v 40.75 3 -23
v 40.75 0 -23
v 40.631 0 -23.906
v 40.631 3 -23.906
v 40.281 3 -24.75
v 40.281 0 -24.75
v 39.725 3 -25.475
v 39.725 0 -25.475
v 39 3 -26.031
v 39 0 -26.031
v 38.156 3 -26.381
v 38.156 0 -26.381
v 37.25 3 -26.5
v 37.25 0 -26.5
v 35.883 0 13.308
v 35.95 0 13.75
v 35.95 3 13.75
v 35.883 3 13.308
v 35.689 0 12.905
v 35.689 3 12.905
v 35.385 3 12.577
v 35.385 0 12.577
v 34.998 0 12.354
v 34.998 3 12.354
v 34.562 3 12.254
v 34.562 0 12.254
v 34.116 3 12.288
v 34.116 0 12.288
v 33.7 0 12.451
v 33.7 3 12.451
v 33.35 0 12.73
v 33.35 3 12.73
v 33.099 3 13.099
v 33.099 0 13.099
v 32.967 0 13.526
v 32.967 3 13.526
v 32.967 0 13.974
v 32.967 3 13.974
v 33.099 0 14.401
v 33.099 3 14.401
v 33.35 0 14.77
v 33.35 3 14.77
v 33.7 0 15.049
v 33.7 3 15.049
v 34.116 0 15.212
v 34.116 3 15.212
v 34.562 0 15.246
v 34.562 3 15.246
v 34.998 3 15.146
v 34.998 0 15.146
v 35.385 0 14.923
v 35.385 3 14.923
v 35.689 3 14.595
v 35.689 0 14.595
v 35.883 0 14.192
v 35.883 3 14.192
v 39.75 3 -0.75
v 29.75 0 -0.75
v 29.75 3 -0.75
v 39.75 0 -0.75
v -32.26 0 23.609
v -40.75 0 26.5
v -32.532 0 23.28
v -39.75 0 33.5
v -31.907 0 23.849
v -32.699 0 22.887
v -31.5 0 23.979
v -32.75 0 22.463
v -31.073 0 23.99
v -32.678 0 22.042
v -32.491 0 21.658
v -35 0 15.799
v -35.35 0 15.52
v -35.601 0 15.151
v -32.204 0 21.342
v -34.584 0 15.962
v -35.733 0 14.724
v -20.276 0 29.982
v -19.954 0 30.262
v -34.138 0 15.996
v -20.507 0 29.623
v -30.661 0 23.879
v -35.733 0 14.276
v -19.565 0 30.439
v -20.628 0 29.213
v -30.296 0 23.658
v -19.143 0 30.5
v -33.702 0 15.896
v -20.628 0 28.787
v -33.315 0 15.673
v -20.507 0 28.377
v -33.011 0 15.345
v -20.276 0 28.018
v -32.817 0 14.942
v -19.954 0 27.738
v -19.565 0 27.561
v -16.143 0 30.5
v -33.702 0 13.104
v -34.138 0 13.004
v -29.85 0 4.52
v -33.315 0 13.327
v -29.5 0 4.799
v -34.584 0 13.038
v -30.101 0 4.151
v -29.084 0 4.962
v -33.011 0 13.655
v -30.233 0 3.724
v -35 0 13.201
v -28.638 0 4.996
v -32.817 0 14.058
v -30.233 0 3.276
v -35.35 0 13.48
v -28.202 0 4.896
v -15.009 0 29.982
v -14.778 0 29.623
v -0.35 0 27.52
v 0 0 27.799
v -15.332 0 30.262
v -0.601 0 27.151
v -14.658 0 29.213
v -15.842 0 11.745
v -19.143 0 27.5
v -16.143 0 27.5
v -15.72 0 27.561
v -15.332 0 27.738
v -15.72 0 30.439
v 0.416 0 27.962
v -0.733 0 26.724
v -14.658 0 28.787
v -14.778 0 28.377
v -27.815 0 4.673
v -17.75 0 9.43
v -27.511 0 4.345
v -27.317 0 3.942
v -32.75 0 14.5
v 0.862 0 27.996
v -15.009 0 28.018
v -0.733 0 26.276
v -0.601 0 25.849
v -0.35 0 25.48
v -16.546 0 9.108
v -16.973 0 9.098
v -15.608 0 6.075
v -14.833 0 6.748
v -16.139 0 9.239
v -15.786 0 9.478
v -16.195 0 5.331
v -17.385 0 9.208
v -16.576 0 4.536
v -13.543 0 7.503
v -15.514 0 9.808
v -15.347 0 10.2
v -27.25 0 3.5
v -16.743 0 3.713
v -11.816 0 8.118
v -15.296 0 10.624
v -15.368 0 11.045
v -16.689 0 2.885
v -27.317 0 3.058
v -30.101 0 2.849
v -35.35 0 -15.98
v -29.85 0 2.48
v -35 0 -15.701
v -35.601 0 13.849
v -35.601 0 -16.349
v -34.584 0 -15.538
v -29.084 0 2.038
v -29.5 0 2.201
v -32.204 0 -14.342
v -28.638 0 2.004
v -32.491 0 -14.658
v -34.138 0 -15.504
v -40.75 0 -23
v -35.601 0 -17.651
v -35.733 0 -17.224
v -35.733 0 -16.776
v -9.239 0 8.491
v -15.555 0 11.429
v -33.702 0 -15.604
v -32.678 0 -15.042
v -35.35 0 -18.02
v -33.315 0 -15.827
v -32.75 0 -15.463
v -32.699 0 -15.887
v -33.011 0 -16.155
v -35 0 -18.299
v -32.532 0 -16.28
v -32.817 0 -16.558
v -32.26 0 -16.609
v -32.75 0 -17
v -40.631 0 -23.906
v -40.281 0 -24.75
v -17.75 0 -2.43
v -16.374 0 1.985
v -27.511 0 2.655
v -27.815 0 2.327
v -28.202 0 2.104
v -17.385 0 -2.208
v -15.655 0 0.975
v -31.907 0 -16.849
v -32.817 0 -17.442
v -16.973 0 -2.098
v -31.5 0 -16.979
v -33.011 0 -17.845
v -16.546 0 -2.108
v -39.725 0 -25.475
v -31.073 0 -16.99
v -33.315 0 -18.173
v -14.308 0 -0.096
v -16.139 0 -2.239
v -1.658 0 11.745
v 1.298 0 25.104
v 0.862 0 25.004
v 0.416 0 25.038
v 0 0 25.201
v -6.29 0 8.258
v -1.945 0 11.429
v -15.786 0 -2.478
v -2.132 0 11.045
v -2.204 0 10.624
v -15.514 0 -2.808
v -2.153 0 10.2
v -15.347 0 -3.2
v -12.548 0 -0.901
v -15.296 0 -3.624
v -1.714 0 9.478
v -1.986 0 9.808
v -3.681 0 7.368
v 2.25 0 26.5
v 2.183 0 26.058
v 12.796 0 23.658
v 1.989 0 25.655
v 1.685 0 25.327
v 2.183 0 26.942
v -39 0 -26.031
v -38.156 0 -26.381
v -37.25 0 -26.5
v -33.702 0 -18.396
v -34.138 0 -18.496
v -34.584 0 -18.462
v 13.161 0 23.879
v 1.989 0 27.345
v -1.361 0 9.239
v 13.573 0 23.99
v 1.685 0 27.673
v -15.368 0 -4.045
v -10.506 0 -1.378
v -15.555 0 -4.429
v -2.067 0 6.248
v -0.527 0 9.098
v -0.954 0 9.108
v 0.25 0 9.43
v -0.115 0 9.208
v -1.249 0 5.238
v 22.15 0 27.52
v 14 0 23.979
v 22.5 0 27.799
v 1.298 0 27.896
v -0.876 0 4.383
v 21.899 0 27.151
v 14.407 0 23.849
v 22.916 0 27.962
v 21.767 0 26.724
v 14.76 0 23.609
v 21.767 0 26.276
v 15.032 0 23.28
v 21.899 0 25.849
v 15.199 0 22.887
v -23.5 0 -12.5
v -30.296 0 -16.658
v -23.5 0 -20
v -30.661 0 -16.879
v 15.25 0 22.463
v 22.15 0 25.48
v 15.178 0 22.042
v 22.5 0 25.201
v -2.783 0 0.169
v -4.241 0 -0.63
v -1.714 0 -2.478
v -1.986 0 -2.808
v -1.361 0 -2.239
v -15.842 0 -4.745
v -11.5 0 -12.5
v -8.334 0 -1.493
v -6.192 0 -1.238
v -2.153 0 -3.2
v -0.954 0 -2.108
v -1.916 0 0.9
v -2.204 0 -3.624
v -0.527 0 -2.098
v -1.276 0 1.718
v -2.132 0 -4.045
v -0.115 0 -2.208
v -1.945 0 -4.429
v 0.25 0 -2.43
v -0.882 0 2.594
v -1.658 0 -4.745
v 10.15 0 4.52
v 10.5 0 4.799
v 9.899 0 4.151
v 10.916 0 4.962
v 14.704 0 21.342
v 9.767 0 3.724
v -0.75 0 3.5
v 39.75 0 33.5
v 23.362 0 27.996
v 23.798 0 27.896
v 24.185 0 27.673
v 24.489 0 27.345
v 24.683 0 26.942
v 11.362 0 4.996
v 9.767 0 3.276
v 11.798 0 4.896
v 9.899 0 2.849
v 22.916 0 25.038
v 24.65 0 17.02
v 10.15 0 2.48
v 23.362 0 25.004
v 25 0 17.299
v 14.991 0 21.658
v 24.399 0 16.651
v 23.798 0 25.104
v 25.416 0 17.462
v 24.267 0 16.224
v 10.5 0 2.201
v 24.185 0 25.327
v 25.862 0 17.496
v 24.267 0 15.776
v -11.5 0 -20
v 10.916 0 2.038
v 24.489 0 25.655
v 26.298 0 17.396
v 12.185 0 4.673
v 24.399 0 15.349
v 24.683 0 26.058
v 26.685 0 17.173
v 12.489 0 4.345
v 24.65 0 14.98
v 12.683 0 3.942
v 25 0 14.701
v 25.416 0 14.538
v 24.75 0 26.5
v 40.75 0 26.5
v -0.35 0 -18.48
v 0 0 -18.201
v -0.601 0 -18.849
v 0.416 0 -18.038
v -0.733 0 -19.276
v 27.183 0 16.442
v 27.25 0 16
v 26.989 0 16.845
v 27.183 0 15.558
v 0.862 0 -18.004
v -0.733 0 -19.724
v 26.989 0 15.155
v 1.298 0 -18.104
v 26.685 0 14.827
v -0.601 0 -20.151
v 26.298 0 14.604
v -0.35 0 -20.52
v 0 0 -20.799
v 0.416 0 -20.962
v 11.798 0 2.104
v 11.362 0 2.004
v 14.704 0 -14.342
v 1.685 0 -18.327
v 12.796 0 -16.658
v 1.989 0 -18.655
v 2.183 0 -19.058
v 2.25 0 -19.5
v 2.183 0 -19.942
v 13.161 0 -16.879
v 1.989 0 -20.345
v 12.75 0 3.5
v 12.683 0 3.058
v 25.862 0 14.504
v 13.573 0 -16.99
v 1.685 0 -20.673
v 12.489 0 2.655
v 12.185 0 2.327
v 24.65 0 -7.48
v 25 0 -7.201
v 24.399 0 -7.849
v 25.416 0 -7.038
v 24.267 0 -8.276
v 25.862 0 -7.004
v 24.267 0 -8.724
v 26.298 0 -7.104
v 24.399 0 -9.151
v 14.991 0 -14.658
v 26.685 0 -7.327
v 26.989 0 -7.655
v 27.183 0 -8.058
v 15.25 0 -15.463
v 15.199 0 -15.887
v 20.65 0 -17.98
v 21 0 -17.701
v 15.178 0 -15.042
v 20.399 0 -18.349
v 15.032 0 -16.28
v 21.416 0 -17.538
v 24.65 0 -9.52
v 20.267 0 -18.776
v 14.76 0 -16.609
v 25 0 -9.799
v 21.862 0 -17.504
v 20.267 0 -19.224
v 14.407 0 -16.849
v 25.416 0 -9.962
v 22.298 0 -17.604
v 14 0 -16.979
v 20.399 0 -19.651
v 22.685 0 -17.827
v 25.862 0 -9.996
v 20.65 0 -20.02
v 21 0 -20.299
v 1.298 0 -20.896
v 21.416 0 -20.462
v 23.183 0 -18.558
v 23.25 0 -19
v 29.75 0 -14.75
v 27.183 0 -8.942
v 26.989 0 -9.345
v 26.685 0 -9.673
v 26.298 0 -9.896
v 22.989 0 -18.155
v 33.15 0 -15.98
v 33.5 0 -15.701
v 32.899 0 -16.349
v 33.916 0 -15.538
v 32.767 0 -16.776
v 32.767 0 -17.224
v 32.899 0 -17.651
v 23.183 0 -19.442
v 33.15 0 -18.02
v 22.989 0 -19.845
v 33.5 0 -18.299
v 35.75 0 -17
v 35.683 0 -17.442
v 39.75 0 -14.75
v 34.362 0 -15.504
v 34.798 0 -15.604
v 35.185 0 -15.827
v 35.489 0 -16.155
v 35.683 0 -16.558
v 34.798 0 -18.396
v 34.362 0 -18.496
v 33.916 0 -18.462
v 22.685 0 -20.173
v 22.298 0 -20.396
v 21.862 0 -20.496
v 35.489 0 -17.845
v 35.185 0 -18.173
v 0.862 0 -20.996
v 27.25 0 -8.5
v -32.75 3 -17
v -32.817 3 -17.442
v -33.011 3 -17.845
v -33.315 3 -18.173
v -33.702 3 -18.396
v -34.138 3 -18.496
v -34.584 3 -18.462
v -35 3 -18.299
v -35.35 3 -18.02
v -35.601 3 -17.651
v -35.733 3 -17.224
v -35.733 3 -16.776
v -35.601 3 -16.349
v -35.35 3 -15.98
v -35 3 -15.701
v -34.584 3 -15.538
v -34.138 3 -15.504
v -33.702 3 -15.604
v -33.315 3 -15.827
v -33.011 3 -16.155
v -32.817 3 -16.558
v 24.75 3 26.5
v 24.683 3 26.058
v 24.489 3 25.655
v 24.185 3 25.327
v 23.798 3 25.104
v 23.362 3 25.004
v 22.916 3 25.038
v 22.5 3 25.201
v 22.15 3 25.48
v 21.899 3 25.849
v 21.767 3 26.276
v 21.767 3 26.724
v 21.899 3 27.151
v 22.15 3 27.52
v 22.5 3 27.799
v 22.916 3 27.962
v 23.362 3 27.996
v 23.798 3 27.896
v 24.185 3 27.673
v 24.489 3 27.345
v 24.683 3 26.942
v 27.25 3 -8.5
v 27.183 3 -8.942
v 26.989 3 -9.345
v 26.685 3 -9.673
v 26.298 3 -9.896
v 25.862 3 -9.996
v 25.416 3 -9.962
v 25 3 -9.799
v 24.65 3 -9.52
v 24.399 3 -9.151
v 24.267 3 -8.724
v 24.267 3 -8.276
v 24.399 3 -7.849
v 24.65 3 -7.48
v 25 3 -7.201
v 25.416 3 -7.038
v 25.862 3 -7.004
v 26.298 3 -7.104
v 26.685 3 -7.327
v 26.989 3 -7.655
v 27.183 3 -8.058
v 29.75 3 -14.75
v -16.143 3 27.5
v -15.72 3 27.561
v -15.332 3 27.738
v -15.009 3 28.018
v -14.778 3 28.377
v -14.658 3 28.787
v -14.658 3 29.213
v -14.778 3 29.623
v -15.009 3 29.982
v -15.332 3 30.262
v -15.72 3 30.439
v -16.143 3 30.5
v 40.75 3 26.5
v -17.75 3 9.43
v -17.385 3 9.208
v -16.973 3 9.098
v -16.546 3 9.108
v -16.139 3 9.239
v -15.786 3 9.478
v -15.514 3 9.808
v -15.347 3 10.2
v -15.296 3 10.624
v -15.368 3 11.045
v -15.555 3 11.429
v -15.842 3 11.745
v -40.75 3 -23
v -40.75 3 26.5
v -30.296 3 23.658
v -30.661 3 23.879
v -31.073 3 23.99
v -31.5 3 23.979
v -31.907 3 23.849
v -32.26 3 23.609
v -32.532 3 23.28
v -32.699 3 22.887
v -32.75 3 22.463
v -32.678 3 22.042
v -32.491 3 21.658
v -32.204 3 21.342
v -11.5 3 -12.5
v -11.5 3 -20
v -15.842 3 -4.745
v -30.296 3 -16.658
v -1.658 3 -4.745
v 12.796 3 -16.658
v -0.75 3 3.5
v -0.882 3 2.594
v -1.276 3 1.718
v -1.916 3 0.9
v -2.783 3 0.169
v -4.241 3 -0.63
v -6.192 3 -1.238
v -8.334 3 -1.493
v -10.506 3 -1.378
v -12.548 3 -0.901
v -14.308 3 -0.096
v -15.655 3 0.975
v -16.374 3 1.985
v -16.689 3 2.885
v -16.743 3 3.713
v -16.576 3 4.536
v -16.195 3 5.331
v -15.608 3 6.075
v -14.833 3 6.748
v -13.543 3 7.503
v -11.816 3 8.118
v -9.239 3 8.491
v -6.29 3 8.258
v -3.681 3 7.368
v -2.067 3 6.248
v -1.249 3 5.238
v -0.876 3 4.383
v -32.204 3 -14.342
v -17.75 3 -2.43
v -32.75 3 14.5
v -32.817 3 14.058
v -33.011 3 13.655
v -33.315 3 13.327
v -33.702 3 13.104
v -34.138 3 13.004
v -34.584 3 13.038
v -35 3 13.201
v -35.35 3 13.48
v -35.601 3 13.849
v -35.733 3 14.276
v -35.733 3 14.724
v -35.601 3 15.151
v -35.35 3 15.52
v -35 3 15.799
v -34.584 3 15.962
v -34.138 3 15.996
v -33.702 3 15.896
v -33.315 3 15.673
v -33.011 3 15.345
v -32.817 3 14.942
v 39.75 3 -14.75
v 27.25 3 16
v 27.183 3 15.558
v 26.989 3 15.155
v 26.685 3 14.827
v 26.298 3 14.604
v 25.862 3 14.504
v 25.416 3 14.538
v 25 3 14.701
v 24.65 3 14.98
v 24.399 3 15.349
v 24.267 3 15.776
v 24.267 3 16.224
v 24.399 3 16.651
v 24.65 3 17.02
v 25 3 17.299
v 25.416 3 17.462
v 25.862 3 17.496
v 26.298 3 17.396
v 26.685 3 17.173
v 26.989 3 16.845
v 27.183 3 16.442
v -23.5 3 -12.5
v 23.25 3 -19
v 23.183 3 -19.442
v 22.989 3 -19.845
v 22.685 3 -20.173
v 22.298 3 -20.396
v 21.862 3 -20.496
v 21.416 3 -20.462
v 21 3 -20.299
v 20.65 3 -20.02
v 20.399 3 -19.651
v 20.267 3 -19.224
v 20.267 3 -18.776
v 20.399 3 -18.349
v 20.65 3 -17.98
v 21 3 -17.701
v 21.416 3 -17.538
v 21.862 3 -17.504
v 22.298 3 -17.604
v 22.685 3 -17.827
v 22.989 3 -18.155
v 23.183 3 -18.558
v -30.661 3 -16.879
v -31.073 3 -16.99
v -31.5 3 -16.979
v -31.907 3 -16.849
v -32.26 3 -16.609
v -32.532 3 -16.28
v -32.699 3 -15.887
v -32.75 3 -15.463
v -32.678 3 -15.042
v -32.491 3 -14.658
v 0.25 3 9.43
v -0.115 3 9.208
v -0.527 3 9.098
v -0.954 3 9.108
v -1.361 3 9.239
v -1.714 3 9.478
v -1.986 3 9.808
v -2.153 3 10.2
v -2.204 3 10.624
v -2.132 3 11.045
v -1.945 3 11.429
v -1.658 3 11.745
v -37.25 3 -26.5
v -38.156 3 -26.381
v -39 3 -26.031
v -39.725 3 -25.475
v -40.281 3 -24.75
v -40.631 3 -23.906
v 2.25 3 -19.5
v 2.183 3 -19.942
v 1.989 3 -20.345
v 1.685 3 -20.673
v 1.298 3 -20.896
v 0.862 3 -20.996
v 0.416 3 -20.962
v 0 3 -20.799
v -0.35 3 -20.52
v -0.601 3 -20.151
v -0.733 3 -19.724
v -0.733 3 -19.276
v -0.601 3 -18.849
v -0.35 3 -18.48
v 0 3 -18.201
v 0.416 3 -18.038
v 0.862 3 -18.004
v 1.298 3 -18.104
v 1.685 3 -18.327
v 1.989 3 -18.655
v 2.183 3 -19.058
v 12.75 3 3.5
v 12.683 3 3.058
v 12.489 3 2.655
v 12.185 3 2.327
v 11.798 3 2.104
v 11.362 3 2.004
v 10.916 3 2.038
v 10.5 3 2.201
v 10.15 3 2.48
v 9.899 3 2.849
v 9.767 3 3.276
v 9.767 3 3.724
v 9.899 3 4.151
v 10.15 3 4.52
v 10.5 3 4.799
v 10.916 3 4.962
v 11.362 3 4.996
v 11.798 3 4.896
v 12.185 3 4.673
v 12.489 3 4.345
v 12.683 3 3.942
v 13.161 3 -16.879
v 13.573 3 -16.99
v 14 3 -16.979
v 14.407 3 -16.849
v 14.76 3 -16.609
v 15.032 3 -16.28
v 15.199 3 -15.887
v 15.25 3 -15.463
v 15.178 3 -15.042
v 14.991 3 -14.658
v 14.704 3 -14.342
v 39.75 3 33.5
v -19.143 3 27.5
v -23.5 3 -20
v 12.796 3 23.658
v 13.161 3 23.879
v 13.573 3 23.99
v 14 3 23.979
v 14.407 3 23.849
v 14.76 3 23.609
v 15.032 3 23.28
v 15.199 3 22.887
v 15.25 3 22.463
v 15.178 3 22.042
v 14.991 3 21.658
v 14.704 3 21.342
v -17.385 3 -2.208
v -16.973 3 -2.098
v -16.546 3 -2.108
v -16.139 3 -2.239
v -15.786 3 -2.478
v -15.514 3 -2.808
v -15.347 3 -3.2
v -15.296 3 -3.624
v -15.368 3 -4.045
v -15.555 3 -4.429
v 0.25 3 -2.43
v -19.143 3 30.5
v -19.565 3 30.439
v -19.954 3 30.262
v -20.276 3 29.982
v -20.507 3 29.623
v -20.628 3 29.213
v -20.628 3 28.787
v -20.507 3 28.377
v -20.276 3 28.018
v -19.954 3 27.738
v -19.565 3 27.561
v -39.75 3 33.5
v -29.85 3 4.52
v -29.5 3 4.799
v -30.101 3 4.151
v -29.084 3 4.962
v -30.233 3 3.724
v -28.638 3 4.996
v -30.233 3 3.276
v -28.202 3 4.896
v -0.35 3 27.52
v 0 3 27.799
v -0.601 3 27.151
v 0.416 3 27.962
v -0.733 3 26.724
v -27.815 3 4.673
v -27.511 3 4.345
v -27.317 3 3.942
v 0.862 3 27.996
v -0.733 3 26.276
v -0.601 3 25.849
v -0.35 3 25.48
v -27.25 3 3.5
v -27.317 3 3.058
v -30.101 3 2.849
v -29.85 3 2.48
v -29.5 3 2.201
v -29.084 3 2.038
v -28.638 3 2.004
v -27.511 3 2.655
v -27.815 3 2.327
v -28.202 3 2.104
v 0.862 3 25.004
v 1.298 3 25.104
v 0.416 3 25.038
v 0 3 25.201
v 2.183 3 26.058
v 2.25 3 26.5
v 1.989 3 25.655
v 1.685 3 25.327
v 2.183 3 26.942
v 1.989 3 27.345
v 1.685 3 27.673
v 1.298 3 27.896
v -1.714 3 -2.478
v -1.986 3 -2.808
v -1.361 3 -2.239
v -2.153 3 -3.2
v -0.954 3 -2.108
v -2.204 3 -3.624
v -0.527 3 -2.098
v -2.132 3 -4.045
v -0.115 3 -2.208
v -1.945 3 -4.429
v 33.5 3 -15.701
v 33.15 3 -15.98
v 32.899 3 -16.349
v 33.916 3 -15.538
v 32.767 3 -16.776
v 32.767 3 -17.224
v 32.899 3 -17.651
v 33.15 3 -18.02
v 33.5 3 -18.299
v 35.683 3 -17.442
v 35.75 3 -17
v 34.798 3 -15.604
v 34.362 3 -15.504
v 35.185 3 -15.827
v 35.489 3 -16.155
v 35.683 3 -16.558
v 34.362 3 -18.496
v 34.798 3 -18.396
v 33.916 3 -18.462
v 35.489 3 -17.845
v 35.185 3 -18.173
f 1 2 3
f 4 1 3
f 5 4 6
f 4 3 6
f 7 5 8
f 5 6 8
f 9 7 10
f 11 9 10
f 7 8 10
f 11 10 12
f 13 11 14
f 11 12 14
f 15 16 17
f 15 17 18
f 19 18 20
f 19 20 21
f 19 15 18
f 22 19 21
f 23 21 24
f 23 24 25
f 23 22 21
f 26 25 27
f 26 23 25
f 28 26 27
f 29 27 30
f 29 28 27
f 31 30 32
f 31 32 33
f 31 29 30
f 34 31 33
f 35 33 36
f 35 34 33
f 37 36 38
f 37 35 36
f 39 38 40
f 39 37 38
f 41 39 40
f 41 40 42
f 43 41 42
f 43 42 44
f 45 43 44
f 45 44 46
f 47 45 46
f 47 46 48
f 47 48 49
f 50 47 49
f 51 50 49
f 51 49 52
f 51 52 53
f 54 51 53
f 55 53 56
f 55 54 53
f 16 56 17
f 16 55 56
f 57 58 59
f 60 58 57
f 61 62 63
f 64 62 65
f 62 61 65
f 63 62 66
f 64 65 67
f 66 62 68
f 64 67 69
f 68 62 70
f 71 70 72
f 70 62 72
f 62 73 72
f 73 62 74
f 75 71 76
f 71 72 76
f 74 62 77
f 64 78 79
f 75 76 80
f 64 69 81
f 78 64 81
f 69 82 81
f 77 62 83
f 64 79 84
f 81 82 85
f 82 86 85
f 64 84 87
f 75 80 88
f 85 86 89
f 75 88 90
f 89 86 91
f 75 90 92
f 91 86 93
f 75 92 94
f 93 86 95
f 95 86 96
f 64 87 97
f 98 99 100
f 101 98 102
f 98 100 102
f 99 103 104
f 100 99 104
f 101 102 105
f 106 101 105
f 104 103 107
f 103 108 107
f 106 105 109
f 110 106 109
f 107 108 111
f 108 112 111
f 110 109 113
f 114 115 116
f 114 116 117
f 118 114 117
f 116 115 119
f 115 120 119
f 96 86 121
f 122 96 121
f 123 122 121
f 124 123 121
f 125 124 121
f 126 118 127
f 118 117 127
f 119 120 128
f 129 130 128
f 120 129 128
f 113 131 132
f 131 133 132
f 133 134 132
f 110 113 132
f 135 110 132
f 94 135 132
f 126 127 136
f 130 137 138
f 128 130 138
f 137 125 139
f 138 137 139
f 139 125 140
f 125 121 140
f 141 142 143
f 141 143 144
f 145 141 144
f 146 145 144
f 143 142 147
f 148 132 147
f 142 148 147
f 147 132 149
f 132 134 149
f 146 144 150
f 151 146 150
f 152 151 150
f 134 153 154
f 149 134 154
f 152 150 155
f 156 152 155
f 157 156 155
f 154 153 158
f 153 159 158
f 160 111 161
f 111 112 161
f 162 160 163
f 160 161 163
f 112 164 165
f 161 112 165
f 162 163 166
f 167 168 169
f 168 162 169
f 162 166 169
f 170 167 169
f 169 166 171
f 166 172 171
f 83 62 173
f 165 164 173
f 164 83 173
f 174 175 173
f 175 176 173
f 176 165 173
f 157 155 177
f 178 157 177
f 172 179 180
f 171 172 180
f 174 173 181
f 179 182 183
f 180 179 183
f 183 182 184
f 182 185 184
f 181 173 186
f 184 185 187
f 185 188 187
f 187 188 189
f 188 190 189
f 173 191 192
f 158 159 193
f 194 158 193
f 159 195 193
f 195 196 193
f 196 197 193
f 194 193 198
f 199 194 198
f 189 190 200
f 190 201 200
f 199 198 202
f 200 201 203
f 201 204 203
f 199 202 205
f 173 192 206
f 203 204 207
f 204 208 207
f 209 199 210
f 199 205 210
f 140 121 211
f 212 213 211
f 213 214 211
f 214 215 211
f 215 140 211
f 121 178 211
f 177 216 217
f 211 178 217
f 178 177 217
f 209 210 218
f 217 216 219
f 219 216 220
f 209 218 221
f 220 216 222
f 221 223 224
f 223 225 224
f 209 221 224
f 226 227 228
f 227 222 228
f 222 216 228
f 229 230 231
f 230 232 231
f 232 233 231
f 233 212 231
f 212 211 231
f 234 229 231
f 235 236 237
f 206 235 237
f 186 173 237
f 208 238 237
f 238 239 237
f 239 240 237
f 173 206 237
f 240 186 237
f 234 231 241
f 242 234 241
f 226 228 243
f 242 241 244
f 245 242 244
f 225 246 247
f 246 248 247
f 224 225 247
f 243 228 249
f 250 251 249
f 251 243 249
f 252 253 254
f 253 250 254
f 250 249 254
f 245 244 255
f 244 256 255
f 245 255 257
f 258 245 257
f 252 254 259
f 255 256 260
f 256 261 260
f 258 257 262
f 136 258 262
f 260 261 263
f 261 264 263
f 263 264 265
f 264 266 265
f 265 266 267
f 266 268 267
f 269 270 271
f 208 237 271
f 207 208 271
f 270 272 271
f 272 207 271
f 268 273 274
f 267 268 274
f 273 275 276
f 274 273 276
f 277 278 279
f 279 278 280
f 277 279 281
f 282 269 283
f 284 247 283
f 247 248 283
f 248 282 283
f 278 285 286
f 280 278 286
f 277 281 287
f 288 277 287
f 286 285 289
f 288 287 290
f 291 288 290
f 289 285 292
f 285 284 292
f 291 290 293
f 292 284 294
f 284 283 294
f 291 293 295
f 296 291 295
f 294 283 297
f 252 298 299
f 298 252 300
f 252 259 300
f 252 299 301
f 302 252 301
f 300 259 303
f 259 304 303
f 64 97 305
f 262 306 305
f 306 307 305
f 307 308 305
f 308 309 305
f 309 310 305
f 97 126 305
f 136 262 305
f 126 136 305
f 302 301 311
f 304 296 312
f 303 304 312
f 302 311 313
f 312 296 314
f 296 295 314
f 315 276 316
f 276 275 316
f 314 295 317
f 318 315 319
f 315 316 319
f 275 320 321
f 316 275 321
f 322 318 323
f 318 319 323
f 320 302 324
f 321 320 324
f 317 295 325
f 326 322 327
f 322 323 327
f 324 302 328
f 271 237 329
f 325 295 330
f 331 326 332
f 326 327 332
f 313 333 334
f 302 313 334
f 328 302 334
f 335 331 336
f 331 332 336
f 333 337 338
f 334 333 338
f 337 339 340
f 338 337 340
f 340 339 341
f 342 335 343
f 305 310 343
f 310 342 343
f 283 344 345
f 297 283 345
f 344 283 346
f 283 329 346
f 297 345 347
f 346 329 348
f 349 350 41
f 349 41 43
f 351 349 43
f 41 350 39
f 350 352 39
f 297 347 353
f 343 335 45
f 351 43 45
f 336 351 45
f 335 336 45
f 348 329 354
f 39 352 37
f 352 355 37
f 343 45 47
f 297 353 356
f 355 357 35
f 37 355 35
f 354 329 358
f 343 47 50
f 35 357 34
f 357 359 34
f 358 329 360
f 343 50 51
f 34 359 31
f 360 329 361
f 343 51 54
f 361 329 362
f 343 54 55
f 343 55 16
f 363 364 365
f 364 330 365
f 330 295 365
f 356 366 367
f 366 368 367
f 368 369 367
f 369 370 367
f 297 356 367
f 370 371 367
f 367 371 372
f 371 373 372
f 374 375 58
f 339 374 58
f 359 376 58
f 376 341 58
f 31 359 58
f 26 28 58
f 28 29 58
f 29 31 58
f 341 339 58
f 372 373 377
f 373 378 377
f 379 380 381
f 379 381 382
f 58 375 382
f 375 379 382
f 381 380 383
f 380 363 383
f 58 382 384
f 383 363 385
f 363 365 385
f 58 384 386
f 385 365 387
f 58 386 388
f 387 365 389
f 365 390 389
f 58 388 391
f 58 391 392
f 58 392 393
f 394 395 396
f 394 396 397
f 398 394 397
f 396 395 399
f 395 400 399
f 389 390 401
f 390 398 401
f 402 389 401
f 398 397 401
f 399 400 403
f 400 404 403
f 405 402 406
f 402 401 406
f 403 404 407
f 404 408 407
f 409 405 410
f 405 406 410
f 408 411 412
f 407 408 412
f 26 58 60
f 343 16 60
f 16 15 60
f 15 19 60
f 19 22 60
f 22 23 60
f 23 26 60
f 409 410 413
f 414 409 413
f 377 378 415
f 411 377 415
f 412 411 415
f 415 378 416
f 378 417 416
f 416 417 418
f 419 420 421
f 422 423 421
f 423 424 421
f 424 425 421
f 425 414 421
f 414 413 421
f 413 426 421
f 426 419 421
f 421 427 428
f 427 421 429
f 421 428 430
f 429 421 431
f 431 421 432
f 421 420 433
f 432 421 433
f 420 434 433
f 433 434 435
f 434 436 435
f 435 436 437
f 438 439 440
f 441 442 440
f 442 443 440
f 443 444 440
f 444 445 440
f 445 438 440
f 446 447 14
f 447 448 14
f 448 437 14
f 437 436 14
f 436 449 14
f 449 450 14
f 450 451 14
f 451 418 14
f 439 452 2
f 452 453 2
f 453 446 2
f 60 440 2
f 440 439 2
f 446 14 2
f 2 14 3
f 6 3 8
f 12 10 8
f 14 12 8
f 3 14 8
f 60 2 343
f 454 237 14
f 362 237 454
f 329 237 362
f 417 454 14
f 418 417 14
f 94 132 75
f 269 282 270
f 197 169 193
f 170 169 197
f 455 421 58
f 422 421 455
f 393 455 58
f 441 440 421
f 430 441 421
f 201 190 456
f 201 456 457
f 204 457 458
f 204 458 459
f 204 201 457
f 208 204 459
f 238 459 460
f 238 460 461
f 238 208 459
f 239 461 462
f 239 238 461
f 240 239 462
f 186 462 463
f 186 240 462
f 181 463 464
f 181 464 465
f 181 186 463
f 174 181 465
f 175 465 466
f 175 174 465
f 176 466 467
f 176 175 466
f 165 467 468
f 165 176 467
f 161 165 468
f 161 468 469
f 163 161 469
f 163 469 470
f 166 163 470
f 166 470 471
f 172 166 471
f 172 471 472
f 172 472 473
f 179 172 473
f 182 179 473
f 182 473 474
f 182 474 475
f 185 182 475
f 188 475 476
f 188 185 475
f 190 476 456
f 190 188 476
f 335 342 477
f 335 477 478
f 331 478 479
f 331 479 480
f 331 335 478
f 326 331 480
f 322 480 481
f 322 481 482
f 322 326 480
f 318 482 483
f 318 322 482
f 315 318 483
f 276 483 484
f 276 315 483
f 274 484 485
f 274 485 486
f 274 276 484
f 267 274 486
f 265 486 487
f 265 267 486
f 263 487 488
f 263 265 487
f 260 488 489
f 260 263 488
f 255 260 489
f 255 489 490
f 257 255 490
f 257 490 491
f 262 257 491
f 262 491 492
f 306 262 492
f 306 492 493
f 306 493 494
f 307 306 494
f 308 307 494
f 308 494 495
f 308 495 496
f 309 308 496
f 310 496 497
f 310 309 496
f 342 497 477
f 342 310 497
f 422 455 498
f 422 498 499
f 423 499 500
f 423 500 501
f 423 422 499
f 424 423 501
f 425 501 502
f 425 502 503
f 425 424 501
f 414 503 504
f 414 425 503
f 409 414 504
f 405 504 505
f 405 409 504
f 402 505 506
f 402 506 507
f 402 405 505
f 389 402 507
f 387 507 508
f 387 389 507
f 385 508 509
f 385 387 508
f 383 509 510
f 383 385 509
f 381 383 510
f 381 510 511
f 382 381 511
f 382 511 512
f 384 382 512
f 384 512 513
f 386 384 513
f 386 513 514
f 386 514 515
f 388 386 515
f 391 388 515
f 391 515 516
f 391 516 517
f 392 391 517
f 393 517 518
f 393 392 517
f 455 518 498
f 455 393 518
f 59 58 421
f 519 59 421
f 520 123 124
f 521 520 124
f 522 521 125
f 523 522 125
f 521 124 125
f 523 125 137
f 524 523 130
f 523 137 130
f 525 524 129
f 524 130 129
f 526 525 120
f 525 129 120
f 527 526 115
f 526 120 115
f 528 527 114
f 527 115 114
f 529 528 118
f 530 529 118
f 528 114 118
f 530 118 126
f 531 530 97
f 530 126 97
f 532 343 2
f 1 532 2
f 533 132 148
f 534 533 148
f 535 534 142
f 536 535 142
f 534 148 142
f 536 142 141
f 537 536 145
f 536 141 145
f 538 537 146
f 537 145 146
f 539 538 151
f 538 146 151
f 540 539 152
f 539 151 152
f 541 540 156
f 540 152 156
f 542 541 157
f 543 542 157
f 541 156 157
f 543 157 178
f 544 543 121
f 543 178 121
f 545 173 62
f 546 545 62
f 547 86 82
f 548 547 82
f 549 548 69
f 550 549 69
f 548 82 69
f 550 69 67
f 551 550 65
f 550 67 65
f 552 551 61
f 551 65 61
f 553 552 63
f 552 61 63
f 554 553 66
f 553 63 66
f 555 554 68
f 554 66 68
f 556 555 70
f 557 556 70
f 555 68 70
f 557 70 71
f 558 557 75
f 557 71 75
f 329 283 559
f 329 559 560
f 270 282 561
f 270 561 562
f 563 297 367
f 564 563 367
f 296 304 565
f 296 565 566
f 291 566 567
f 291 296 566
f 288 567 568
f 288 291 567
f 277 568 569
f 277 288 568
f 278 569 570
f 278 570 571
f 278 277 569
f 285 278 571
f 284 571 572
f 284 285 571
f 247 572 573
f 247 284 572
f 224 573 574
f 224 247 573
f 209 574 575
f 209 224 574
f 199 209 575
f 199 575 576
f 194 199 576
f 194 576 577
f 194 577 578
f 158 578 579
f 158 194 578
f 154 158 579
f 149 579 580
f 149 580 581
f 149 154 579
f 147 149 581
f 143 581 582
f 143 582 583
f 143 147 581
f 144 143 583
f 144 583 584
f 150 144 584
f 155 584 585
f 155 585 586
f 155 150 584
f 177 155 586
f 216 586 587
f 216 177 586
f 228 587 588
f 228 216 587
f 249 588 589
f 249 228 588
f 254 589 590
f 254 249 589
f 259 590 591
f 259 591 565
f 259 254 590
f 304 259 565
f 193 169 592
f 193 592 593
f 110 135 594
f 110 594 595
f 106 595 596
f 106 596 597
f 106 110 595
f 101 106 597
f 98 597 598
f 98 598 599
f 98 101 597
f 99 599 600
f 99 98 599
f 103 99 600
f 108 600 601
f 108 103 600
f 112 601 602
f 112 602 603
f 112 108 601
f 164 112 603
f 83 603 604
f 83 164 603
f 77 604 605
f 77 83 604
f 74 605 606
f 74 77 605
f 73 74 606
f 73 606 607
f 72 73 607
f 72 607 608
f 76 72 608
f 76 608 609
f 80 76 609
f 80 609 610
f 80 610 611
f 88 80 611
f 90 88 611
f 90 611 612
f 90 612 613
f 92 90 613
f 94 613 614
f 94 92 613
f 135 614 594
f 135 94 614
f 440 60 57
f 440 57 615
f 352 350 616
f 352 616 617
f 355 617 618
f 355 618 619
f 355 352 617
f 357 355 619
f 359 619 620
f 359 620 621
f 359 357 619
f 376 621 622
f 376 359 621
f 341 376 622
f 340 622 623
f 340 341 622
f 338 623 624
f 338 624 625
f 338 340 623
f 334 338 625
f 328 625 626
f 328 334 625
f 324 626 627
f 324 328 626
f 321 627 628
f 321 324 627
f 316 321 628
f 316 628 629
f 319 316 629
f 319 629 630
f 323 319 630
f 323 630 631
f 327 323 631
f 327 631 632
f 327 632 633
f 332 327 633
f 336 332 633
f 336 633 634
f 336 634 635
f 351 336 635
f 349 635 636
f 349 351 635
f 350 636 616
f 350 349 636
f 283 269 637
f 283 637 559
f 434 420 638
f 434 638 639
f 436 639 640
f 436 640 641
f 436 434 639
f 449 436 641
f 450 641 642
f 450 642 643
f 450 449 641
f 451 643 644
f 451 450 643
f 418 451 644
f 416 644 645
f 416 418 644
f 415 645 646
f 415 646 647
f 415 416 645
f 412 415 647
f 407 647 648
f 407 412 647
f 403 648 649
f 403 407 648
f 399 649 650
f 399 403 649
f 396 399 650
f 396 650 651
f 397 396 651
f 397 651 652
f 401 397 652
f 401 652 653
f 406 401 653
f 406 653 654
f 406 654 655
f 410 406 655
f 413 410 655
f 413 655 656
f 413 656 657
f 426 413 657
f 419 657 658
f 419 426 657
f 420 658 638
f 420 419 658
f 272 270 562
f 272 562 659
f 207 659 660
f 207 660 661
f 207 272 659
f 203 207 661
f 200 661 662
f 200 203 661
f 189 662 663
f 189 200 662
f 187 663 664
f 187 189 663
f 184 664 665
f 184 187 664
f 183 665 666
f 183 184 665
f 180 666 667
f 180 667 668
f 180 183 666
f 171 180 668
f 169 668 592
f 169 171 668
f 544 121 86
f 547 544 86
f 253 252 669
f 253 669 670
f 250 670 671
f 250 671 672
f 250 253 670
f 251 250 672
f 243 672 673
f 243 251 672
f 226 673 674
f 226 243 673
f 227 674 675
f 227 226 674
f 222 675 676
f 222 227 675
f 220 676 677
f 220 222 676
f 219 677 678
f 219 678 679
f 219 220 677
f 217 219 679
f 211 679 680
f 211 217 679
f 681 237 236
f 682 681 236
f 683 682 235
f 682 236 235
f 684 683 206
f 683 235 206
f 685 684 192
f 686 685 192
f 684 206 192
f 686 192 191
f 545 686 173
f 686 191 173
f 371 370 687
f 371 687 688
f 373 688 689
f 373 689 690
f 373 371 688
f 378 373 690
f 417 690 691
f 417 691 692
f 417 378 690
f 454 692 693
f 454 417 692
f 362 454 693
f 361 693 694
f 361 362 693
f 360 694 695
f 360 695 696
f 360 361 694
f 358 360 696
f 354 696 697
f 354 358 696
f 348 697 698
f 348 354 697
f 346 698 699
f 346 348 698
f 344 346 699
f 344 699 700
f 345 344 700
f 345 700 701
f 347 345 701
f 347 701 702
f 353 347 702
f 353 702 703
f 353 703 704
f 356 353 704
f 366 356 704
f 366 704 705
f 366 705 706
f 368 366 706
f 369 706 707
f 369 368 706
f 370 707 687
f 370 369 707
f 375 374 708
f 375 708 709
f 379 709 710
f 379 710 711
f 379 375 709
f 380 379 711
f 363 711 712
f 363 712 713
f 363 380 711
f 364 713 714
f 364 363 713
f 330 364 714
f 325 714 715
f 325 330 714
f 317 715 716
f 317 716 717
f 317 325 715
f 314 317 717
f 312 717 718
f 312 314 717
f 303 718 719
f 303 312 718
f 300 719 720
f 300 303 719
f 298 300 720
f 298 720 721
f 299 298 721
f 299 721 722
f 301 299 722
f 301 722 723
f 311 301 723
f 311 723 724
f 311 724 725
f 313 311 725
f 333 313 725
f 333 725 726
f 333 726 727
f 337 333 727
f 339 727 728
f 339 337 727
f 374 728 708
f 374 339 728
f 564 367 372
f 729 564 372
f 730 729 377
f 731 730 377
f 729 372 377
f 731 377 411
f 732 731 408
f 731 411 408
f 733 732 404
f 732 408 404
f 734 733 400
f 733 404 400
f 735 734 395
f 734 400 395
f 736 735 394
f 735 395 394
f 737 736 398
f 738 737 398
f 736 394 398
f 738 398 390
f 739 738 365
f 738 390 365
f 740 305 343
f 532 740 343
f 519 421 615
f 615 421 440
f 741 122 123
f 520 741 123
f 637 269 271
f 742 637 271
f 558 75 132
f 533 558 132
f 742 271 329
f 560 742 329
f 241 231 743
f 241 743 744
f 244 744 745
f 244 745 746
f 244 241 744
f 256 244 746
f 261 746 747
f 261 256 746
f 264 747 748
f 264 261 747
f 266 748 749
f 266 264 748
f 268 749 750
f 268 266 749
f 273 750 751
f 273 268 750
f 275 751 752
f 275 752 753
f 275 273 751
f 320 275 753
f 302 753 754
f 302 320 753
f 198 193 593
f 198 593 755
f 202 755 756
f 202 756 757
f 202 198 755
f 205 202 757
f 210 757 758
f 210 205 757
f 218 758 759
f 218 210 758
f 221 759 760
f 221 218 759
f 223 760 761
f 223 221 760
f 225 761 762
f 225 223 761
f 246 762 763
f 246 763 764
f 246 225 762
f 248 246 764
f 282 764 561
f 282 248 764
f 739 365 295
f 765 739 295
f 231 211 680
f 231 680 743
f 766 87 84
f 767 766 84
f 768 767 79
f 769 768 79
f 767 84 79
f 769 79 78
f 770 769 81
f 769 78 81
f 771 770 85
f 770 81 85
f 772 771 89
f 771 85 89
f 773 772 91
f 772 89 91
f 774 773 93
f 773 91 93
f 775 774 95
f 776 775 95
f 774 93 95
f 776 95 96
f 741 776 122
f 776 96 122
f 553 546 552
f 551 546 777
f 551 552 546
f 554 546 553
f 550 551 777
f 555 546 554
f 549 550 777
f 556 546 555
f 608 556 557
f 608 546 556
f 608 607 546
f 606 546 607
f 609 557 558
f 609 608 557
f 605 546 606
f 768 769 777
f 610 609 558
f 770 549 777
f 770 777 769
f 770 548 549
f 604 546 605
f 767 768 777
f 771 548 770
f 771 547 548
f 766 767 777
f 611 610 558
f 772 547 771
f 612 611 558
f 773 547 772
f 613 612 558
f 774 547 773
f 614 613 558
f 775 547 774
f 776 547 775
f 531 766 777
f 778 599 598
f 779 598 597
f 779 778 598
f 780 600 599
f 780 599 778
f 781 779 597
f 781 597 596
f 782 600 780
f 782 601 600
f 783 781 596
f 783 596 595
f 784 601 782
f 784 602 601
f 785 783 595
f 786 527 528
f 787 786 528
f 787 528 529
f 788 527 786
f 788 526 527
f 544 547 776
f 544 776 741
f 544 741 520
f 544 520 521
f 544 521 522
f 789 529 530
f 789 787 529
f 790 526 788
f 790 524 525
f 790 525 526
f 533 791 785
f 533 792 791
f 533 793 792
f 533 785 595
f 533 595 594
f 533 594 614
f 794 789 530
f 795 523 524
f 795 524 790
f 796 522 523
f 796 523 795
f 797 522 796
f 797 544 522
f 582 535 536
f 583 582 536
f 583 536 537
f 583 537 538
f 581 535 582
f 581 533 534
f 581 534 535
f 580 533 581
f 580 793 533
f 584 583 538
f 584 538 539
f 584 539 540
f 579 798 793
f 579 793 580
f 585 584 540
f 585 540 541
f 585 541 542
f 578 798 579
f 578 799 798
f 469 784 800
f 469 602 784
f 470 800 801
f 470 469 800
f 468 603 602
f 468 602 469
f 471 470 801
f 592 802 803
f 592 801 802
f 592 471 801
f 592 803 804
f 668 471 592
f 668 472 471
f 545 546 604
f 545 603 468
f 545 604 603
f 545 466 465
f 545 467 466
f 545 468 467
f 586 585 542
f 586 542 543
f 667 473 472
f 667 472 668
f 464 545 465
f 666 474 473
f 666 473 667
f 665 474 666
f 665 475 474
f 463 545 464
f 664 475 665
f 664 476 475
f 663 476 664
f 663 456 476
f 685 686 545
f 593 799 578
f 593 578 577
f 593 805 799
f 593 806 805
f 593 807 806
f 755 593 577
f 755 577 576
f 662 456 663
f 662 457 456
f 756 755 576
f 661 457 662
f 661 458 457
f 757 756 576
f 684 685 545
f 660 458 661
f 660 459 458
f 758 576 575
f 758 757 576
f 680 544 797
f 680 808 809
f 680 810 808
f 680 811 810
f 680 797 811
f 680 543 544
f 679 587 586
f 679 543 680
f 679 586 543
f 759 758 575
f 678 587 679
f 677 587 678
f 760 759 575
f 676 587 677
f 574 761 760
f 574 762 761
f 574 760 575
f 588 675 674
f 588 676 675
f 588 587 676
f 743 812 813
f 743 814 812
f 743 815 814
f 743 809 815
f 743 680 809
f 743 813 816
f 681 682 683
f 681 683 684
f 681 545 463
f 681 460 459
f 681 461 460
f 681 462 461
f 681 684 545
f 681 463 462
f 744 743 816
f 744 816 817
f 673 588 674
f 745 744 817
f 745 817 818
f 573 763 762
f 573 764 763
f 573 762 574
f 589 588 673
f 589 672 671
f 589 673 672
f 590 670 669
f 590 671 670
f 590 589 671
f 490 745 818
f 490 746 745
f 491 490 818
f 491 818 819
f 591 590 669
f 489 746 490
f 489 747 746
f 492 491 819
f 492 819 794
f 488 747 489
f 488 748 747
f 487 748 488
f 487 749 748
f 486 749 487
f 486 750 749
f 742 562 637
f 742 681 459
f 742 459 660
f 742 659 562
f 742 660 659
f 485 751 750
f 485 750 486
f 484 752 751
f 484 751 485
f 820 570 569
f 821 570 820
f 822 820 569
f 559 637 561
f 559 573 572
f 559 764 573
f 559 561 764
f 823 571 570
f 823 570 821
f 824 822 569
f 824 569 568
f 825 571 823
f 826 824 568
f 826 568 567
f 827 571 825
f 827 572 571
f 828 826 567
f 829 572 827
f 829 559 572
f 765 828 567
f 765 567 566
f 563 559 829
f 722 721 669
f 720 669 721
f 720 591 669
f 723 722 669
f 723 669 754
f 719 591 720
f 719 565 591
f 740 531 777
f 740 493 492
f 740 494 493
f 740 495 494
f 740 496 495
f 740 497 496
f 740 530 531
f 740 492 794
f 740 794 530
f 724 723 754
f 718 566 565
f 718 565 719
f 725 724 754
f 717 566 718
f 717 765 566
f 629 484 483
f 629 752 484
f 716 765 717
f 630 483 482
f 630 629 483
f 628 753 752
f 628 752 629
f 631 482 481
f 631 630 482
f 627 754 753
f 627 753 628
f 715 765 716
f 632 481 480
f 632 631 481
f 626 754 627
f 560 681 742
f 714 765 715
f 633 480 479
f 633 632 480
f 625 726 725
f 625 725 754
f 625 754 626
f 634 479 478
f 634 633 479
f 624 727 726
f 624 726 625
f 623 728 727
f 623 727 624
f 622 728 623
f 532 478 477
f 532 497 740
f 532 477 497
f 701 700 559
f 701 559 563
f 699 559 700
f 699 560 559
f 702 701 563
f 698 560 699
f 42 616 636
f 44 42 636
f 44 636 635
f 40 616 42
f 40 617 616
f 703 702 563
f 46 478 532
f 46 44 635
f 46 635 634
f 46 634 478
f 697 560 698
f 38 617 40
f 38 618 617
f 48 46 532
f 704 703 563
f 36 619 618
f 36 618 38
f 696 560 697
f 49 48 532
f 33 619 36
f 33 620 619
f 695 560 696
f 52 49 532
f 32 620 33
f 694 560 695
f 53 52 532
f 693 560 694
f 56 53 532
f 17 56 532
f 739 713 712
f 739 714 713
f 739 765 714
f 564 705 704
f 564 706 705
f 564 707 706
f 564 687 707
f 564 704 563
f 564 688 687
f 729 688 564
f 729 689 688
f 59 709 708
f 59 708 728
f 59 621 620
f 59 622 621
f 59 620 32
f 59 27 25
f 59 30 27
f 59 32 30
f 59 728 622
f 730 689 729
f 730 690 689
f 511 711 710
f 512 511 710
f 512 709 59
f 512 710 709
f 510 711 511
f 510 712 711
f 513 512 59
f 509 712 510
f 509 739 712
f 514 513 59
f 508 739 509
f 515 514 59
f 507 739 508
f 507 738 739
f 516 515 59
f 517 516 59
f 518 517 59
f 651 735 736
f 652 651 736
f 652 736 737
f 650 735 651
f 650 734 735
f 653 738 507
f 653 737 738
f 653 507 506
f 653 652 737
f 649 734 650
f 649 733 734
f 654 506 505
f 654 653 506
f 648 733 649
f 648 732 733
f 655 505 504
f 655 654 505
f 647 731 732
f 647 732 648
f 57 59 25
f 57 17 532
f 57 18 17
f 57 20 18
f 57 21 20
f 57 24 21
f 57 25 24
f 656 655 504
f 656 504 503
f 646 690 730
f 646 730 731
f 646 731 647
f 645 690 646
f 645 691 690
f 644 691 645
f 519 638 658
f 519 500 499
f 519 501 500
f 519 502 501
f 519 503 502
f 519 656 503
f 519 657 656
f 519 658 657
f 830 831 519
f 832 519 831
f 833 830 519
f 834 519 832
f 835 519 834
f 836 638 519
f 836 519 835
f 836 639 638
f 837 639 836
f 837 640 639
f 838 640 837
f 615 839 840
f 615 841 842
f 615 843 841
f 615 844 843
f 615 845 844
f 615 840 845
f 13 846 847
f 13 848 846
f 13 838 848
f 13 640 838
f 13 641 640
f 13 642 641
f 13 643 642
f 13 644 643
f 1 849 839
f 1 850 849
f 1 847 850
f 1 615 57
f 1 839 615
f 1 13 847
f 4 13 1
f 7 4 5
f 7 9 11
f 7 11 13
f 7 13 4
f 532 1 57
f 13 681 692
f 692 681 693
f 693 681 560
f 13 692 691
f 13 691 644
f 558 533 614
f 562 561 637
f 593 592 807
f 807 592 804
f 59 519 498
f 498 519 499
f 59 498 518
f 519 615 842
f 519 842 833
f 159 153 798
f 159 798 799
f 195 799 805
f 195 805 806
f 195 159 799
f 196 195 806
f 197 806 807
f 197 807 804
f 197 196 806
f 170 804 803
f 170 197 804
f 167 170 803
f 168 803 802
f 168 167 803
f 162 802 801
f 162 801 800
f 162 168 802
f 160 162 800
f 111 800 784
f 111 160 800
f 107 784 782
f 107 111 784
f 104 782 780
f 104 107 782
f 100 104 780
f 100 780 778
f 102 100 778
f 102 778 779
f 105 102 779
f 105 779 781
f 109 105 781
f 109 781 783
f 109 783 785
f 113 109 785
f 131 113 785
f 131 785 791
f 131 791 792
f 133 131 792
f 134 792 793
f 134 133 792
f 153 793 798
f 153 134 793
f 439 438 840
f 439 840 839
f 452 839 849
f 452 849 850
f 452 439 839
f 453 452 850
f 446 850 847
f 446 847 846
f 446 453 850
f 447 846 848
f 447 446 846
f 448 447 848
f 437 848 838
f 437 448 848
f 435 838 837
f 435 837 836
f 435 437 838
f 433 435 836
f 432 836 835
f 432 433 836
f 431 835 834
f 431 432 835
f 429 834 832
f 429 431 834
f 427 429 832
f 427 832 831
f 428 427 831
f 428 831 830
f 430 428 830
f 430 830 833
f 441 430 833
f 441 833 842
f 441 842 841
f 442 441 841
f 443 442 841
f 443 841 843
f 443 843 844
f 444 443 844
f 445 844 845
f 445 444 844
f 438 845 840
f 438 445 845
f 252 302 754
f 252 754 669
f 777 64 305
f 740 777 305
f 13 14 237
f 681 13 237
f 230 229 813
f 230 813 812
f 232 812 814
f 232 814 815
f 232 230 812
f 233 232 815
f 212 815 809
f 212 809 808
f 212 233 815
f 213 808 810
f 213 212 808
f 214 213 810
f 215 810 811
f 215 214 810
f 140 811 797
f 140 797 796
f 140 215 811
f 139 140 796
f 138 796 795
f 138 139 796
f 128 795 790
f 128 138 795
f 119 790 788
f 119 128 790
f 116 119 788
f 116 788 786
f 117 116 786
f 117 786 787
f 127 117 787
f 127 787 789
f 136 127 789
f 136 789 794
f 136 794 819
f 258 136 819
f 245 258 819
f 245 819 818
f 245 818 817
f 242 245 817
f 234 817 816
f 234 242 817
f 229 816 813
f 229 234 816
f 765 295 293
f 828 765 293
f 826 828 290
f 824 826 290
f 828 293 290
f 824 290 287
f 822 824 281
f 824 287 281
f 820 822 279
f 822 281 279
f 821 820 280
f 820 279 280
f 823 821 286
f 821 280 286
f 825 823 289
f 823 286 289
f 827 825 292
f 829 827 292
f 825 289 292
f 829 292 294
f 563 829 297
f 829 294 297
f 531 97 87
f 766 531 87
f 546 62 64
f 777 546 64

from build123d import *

# Parameters (mm, degrees)
CROQUIS1_R              = 1.5
CROQUIS1_RX             = 8
CROQUIS1_RY             = 5
CROQUIS1_W              = 10
CROQUIS1_H              = 14
CROQUIS1_W_2            = 12
CROQUIS1_H_2            = 7.5
SALIENTE_EXTRUIR1_DEPTH = 3


with BuildPart() as part:
    # Croquis1 → Saliente-Extruir1 (new body)
    with BuildSketch(Plane(origin=(0, 0, 0), x_dir=(1, 0, 0), z_dir=(0, 1, 0))):
        with BuildLine():
            Line((40.75, -26.5), (40.75, 23))
            ThreePointArc((40.75, 23), (39.724873734, 25.474873734), (37.25, 26.5))
            Line((37.25, 26.5), (-37.25, 26.5))
            ThreePointArc((-37.25, 26.5), (-39.724873734, 25.474873734), (-40.75, 23))
            Line((-40.75, 23), (-40.75, -26.5))
            Line((-40.75, -26.5), (-39.75, -33.5))
            Line((-39.75, -33.5), (39.75, -33.5))
            Line((39.75, -33.5), (40.75, -26.5))
        make_face()
        with Locations((34.25, 17)):
            Circle(CROQUIS1_R, mode=Mode.SUBTRACT)
        with Locations((-34.25, 17)):
            Circle(CROQUIS1_R, mode=Mode.SUBTRACT)
        with Locations((34.45, -13.75)):
            Circle(CROQUIS1_R, mode=Mode.SUBTRACT)
        with Locations((25.75, -16)):
            Circle(CROQUIS1_R, mode=Mode.SUBTRACT)
        with Locations((23.25, -26.5)):
            Circle(CROQUIS1_R, mode=Mode.SUBTRACT)
        with Locations((25.75, 8.5)):
            Circle(CROQUIS1_R, mode=Mode.SUBTRACT)
        with Locations((21.75, 19)):
            Circle(CROQUIS1_R, mode=Mode.SUBTRACT)
        with Locations((11.25, -3.5)):
            Circle(CROQUIS1_R, mode=Mode.SUBTRACT)
        with Locations((-28.75, -3.5)):
            Circle(CROQUIS1_R, mode=Mode.SUBTRACT)
        with Locations((0.75, -26.5)):
            Circle(CROQUIS1_R, mode=Mode.SUBTRACT)
        with Locations((0.75, 19.5)):
            Circle(CROQUIS1_R, mode=Mode.SUBTRACT)
        with Locations((-34.25, -14.5)):
            Circle(CROQUIS1_R, mode=Mode.SUBTRACT)
        with Locations((-8.75, -3.5)):
            Ellipse(CROQUIS1_RX, CROQUIS1_RY, mode=Mode.SUBTRACT)
        with Locations((34.75, 7.75)):
            Rectangle(CROQUIS1_W, CROQUIS1_H, mode=Mode.SUBTRACT)
        with BuildLine():
            Line((-1.658013335, 4.744885232), (12.795993333, 16.65752809))
            ThreePointArc((12.795993333, 16.65752809), (14.90752809, 16.454006667), (14.704006667, 14.34247191))
            Line((14.704006667, 14.34247191), (0.25, 2.429829053))
            ThreePointArc((0.25, 2.429829053), (-1.861534757, 2.633350475), (-1.658013335, 4.744885232))
        make_face(mode=Mode.SUBTRACT)
        with BuildLine():
            Line((-1.658013335, -11.744885232), (12.795993333, -23.65752809))
            ThreePointArc((12.795993333, -23.65752809), (14.90752809, -23.454006667), (14.704006667, -21.34247191))
            Line((14.704006667, -21.34247191), (0.25, -9.429829053))
            ThreePointArc((0.25, -9.429829053), (-1.861534757, -9.633350475), (-1.658013335, -11.744885232))
        make_face(mode=Mode.SUBTRACT)
        with BuildLine():
            Line((-15.841986665, -11.744885232), (-30.295993333, -23.65752809))
            ThreePointArc((-30.295993333, -23.65752809), (-32.40752809, -23.454006667), (-32.204006667, -21.34247191))
            Line((-32.204006667, -21.34247191), (-17.75, -9.429829053))
            ThreePointArc((-17.75, -9.429829053), (-15.638465243, -9.633350475), (-15.841986665, -11.744885232))
        make_face(mode=Mode.SUBTRACT)
        with BuildLine():
            Line((-15.841986665, 4.744885232), (-30.295993333, 16.65752809))
            ThreePointArc((-30.295993333, 16.65752809), (-32.40752809, 16.454006667), (-32.204006667, 14.34247191))
            Line((-32.204006667, 14.34247191), (-17.75, 2.429829053))
            ThreePointArc((-17.75, 2.429829053), (-15.638465243, 2.633350475), (-15.841986665, 4.744885232))
        make_face(mode=Mode.SUBTRACT)
        with BuildLine():
            Line((-19.142857143, -27.5), (-16.142857143, -27.5))
            ThreePointArc((-16.142857143, -27.5), (-14.642857143, -29), (-16.142857143, -30.5))
            Line((-16.142857143, -30.5), (-19.142857143, -30.5))
            ThreePointArc((-19.142857143, -30.5), (-20.642857143, -29), (-19.142857143, -27.5))
        make_face(mode=Mode.SUBTRACT)
        with Locations((-17.5, 16.25)):
            Rectangle(CROQUIS1_W_2, CROQUIS1_H_2, mode=Mode.SUBTRACT)
    extrude(amount=SALIENTE_EXTRUIR1_DEPTH)


solid = part.part
